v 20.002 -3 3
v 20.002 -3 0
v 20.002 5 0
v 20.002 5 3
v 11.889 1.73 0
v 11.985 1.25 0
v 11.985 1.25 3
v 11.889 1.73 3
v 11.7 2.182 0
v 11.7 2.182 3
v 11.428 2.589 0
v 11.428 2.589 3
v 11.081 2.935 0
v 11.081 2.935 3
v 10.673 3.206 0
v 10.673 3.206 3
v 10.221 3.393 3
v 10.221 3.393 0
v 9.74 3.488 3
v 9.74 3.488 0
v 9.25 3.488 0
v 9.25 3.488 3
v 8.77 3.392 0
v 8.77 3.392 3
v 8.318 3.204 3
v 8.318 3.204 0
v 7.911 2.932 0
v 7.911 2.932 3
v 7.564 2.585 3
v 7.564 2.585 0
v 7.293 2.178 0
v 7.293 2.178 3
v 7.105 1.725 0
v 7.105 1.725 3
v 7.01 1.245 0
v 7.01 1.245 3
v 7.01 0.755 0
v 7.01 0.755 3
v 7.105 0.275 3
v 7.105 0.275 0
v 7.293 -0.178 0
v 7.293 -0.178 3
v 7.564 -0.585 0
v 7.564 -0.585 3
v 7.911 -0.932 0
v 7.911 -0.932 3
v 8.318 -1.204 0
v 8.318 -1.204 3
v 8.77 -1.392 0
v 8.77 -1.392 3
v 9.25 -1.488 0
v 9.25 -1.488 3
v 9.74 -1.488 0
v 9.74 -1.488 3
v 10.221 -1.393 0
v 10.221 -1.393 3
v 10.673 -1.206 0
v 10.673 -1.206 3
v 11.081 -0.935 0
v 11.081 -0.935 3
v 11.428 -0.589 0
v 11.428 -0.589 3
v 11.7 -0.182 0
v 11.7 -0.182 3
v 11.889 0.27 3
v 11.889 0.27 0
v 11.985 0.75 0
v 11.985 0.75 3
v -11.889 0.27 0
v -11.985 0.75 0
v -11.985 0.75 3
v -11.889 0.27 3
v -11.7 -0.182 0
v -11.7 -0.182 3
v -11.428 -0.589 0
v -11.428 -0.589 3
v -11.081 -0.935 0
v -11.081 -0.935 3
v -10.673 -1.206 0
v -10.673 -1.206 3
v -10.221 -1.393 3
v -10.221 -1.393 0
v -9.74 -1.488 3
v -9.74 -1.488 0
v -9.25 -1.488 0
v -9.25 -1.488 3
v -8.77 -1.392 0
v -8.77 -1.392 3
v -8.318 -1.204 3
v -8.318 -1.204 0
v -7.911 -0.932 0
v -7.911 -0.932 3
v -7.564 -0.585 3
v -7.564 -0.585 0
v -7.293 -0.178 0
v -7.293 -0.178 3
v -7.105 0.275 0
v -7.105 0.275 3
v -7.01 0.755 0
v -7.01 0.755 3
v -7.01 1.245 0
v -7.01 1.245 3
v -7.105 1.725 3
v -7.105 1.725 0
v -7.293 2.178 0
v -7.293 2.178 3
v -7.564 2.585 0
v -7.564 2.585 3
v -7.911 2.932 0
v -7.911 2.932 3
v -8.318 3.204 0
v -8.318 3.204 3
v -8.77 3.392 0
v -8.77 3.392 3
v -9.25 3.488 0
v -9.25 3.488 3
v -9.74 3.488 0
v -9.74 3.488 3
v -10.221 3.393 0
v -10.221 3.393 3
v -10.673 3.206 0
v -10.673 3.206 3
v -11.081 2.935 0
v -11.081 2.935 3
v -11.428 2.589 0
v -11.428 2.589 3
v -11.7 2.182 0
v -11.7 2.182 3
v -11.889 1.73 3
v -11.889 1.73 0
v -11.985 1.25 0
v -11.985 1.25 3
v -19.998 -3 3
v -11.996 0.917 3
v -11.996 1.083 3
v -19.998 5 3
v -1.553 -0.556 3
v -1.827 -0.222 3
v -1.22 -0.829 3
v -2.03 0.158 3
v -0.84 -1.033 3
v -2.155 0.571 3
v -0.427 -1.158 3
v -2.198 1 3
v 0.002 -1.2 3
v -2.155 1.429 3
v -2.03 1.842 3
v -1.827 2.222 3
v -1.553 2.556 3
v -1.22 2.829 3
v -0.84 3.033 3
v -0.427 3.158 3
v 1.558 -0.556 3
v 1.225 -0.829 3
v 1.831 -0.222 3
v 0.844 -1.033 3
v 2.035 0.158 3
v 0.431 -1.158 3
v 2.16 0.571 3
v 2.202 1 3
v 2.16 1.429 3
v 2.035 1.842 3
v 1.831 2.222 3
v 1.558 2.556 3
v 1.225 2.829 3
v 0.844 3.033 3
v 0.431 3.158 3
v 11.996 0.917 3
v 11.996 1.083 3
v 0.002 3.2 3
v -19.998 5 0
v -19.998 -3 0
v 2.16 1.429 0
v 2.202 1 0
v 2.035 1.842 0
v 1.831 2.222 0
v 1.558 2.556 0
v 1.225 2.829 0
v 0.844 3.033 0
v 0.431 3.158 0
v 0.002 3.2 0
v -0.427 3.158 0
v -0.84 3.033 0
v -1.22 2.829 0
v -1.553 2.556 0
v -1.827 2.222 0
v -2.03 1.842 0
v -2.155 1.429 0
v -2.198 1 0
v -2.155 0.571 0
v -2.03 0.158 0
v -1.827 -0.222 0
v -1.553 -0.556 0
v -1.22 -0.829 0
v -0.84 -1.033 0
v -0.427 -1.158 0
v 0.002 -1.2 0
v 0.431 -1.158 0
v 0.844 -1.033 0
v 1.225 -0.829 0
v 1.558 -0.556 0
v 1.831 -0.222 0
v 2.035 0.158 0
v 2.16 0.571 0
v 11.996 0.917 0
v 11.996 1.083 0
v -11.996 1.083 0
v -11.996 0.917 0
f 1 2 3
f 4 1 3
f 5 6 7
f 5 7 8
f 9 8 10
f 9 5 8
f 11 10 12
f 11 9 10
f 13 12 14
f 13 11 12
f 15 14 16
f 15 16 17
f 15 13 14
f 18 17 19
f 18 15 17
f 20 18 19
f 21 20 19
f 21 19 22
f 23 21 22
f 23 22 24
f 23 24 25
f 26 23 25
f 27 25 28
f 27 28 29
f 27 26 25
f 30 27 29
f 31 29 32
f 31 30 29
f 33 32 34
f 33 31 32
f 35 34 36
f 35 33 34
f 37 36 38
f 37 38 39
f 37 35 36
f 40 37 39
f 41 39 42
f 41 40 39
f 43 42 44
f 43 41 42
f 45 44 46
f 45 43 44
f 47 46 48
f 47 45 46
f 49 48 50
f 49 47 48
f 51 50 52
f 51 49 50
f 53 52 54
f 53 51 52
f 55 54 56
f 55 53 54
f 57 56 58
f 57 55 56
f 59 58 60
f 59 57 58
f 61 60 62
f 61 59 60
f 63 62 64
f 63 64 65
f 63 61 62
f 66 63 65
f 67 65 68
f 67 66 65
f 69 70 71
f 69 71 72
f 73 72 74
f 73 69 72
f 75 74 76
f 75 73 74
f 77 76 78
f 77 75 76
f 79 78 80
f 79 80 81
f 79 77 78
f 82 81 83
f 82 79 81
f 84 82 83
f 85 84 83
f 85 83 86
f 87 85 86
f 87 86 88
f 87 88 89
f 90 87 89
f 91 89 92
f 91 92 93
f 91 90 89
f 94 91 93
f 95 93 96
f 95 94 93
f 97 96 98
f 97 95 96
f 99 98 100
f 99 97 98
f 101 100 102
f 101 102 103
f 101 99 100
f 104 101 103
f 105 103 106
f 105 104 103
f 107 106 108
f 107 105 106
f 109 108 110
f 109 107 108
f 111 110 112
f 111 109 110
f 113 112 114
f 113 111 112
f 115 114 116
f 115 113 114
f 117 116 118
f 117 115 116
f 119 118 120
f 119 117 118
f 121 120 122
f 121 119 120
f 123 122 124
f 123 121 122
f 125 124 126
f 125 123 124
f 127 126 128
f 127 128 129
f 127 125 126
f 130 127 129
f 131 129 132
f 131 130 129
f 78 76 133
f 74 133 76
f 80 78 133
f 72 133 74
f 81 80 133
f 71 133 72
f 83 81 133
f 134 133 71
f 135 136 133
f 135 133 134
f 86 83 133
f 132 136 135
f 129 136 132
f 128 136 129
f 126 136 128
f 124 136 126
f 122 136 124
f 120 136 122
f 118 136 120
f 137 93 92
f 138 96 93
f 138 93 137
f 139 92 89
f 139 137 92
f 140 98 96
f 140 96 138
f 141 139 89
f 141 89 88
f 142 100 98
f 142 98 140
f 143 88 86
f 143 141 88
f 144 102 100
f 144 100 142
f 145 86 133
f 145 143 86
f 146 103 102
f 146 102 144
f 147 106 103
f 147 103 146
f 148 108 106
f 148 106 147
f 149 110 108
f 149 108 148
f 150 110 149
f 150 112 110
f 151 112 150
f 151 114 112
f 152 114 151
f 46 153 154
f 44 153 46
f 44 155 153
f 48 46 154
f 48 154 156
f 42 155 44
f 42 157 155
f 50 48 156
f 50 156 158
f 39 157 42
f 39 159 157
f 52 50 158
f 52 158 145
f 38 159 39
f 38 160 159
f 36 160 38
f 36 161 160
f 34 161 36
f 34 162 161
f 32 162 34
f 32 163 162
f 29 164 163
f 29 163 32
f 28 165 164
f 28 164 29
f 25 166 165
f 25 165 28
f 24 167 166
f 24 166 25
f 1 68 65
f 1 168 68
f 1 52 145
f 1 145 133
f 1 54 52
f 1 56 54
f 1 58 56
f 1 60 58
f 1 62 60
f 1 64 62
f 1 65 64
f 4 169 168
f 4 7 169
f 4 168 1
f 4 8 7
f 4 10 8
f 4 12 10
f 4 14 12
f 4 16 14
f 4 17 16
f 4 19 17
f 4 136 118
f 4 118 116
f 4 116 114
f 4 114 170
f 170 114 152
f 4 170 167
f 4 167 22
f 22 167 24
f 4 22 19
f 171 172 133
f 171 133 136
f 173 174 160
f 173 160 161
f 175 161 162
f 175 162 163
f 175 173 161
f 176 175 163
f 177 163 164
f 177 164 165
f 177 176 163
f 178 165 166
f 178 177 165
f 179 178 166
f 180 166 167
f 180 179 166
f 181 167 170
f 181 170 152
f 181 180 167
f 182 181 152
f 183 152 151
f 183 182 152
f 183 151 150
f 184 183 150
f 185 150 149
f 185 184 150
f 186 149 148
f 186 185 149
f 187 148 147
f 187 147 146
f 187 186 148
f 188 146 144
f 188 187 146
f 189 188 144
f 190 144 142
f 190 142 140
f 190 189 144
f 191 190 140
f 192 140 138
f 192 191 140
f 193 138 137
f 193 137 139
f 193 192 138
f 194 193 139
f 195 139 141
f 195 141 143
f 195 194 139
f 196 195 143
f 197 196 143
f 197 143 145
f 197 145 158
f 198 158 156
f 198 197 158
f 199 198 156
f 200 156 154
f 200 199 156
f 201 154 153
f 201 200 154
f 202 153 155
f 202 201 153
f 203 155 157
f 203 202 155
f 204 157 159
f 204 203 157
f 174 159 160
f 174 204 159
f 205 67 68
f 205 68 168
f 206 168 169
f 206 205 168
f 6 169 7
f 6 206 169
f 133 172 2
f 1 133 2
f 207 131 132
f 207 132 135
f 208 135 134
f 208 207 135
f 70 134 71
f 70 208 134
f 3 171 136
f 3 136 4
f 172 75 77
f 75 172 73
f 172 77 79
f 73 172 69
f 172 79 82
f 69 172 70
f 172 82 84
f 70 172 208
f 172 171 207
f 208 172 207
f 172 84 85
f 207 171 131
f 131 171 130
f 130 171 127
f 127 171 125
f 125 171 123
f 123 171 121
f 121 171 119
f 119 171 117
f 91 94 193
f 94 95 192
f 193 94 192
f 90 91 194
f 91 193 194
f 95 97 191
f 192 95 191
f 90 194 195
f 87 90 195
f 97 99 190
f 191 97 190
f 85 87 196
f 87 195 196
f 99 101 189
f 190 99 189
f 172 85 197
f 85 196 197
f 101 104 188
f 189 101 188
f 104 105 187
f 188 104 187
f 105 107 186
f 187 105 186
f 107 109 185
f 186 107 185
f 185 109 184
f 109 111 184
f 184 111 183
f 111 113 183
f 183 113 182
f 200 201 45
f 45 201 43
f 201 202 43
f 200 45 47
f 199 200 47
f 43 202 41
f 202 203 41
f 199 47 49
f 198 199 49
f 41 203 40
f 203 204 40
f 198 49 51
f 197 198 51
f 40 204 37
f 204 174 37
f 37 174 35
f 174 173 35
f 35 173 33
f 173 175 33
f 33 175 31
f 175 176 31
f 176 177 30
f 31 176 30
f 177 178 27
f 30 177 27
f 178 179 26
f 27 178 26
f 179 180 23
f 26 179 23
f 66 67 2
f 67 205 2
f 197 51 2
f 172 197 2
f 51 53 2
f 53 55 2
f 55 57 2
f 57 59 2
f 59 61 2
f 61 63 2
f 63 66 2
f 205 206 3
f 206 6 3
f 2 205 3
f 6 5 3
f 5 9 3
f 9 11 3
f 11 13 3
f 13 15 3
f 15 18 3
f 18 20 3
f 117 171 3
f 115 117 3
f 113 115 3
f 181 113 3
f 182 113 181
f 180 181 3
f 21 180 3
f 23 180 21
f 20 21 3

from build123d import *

# Parameters (mm, degrees)
SKETCH1_W           = 40
SKETCH1_H           = 8
SKETCH1_R           = 2.2
BOSS_EXTRUDE1_DEPTH = 3


with BuildPart() as part:
    # Sketch1 → Boss-Extrude1 (new body)
    with BuildSketch(Plane.XY):
        with Locations((0.002263133, 1)):
            Rectangle(SKETCH1_W, SKETCH1_H)
        with Locations((0.002263133, 1)):
            Circle(SKETCH1_R, mode=Mode.SUBTRACT)
        with BuildLine():
            ThreePointArc((-11.98520546, 1.25), (-11.997736867, 1), (-11.98520546, 0.75))
            ThreePointArc((-11.98520546, 0.75), (-6.997736867, 1), (-11.98520546, 1.25))
        make_face(mode=Mode.SUBTRACT)
        with BuildLine():
            ThreePointArc((11.98520546, 1.25), (6.997736867, 1), (11.98520546, 0.75))
            ThreePointArc((11.98520546, 0.75), (11.997736867, 1), (11.98520546, 1.25))
        make_face(mode=Mode.SUBTRACT)
    extrude(amount=BOSS_EXTRUDE1_DEPTH)


solid = part.part
